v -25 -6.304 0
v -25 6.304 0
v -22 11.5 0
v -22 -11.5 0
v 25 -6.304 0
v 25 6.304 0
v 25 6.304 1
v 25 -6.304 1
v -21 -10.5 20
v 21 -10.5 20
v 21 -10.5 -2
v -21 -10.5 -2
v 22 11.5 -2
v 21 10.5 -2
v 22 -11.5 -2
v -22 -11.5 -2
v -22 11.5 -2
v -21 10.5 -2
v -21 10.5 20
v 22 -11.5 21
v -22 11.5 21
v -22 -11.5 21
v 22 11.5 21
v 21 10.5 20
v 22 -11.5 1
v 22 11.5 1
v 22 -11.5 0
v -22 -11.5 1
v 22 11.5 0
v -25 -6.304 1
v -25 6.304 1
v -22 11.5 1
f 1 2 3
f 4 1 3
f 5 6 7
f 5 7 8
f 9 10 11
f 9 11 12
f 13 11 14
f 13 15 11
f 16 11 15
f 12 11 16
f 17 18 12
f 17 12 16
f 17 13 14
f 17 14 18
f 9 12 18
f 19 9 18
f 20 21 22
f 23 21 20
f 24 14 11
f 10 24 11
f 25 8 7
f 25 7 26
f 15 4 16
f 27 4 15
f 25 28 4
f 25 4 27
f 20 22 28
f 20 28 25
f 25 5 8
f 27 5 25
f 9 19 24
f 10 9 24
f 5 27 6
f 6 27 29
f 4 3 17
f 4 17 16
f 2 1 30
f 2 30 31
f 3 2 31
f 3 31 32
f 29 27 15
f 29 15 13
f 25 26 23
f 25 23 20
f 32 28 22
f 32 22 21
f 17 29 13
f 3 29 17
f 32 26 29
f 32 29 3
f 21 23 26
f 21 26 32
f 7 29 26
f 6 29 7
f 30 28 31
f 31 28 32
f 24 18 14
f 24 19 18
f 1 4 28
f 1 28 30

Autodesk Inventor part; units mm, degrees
ref_plane "YZ Plane" through (0, 0, 0) normal (1, 0, 0) x (0, 1, 0)
ref_plane "XZ Plane" through (0, 0, 0) normal (0, 1, 0) x (-1, 0, 0)
ref_plane "XY Plane" through (0, 0, 0) normal (0, 0, 1) x (1, 0, 0)
sketch "Эскиз1" plane through (0, 0, 0) normal (0, 0, 1) x (1, 0, 0)
  line L0 (22, -11.5) -> (-22, -11.5)
  line L1 (-22, -11.5) -> (-22, 11.5)
  line L2 (-22, 11.5) -> (22, 11.5)
  line L3 (22, 11.5) -> (22, -11.5)
  line L4 (22, -11.5) -> (-22, 11.5) construction
  line L5 (-22, -11.5) -> (22, 11.5) construction
  line L6 (20, -10.4545) -> (-20, 10.4545) construction
  line L7 (-20, -10.4545) -> (20, 10.4545) construction
  line L8 (21, -10.5) -> (-21, -10.5)
  line L9 (-21, -10.5) -> (-21, 10.5)
  line L10 (-21, 10.5) -> (21, 10.5)
  line L11 (21, 10.5) -> (21, -10.5)
  line L12 (21, -10.5) -> (-21, 10.5) construction
  line L13 (-21, -10.5) -> (21, 10.5) construction
  point P0 (0, 0)
  dimension "d0" = 23
  dimension "d1" = 44
  dimension "d3" = 1
  dimension "d4" = 1
  dimension "d5" = 1
extrude "Выдавливание1" add sketch "Эскиз1" along normal blind 20
sketch "Эскиз3" plane through (0, 0, 20) normal (0, 0, 1) x (1, 0, 0)
  line L0 (22, 11.5) -> (-22, 11.5) projected
  line L1 (-22, -11.5) -> (22, -11.5) projected
  line L2 (-22, 11.5) -> (22, 11.5)
  line L3 (22, 11.5) -> (22, -11.5)
  line L4 (22, -11.5) -> (-22, -11.5)
  line L5 (-22, -11.5) -> (-22, 11.5)
  point P0 (0, 0)
extrude "Выдавливание2" add sketch "Эскиз3" along normal blind 1
sketch "Эскиз4" plane through (0, 0, 0) normal (0, 0, -1) x (-1, 0, 0)
  line L0 (25, -6.3038) -> (25, 6.3038)
  line L1 (-22, 11.5) -> (22, 11.5) projected
  line L2 (25, 6.3038) -> (22, 11.5)
  line L3 (22, -11.5) -> (-22, -11.5) projected
  line L4 (22, 11.5) -> (22, -11.5)
  line L5 (22, -11.5) -> (25, -6.3038)
  line L6 (-22, -11.5) -> (-22, 11.5) projected
  line L7 (-22, -11.5) -> (-22, 11.5)
  line L8 (-22, 11.5) -> (-25, 6.3038)
  line L9 (-25, 6.3038) -> (-25, -6.3038)
  line L10 (-25, -6.3038) -> (-22, -11.5)
  point P0 (0, 0)
  dimension "d10" = 3
  dimension "d11" = 3
  dimension "d12" = 30
  dimension "d13" = 30
  dimension "d14" = 30
  dimension "d15" = 30
extrude "Выдавливание3" add sketch "Эскиз4" against normal blind 1 contours L5 L4 L2 L0 | L10 L9 L8 L6
sketch "Эскиз5" plane through (0, 0, 0) normal (0, 0, -1) x (-1, 0, 0)
  line L0 (-21, 10.5) -> (-21, -10.5) projected
  line L1 (-21, -10.5) -> (21, -10.5) projected
  line L2 (21, -10.5) -> (21, 10.5) projected
  line L3 (21, 10.5) -> (-21, 10.5) projected
  line L4 (22, -11.5) -> (-22, -11.5)
  line L5 (-22, -11.5) -> (-22, 11.5)
  line L6 (-22, 11.5) -> (22, 11.5)
  line L7 (22, 11.5) -> (22, -11.5)
  point P0 (0, 0)
extrude "Выдавливание4" add sketch "Эскиз5" along normal blind 2
properties part number "кейсик"
